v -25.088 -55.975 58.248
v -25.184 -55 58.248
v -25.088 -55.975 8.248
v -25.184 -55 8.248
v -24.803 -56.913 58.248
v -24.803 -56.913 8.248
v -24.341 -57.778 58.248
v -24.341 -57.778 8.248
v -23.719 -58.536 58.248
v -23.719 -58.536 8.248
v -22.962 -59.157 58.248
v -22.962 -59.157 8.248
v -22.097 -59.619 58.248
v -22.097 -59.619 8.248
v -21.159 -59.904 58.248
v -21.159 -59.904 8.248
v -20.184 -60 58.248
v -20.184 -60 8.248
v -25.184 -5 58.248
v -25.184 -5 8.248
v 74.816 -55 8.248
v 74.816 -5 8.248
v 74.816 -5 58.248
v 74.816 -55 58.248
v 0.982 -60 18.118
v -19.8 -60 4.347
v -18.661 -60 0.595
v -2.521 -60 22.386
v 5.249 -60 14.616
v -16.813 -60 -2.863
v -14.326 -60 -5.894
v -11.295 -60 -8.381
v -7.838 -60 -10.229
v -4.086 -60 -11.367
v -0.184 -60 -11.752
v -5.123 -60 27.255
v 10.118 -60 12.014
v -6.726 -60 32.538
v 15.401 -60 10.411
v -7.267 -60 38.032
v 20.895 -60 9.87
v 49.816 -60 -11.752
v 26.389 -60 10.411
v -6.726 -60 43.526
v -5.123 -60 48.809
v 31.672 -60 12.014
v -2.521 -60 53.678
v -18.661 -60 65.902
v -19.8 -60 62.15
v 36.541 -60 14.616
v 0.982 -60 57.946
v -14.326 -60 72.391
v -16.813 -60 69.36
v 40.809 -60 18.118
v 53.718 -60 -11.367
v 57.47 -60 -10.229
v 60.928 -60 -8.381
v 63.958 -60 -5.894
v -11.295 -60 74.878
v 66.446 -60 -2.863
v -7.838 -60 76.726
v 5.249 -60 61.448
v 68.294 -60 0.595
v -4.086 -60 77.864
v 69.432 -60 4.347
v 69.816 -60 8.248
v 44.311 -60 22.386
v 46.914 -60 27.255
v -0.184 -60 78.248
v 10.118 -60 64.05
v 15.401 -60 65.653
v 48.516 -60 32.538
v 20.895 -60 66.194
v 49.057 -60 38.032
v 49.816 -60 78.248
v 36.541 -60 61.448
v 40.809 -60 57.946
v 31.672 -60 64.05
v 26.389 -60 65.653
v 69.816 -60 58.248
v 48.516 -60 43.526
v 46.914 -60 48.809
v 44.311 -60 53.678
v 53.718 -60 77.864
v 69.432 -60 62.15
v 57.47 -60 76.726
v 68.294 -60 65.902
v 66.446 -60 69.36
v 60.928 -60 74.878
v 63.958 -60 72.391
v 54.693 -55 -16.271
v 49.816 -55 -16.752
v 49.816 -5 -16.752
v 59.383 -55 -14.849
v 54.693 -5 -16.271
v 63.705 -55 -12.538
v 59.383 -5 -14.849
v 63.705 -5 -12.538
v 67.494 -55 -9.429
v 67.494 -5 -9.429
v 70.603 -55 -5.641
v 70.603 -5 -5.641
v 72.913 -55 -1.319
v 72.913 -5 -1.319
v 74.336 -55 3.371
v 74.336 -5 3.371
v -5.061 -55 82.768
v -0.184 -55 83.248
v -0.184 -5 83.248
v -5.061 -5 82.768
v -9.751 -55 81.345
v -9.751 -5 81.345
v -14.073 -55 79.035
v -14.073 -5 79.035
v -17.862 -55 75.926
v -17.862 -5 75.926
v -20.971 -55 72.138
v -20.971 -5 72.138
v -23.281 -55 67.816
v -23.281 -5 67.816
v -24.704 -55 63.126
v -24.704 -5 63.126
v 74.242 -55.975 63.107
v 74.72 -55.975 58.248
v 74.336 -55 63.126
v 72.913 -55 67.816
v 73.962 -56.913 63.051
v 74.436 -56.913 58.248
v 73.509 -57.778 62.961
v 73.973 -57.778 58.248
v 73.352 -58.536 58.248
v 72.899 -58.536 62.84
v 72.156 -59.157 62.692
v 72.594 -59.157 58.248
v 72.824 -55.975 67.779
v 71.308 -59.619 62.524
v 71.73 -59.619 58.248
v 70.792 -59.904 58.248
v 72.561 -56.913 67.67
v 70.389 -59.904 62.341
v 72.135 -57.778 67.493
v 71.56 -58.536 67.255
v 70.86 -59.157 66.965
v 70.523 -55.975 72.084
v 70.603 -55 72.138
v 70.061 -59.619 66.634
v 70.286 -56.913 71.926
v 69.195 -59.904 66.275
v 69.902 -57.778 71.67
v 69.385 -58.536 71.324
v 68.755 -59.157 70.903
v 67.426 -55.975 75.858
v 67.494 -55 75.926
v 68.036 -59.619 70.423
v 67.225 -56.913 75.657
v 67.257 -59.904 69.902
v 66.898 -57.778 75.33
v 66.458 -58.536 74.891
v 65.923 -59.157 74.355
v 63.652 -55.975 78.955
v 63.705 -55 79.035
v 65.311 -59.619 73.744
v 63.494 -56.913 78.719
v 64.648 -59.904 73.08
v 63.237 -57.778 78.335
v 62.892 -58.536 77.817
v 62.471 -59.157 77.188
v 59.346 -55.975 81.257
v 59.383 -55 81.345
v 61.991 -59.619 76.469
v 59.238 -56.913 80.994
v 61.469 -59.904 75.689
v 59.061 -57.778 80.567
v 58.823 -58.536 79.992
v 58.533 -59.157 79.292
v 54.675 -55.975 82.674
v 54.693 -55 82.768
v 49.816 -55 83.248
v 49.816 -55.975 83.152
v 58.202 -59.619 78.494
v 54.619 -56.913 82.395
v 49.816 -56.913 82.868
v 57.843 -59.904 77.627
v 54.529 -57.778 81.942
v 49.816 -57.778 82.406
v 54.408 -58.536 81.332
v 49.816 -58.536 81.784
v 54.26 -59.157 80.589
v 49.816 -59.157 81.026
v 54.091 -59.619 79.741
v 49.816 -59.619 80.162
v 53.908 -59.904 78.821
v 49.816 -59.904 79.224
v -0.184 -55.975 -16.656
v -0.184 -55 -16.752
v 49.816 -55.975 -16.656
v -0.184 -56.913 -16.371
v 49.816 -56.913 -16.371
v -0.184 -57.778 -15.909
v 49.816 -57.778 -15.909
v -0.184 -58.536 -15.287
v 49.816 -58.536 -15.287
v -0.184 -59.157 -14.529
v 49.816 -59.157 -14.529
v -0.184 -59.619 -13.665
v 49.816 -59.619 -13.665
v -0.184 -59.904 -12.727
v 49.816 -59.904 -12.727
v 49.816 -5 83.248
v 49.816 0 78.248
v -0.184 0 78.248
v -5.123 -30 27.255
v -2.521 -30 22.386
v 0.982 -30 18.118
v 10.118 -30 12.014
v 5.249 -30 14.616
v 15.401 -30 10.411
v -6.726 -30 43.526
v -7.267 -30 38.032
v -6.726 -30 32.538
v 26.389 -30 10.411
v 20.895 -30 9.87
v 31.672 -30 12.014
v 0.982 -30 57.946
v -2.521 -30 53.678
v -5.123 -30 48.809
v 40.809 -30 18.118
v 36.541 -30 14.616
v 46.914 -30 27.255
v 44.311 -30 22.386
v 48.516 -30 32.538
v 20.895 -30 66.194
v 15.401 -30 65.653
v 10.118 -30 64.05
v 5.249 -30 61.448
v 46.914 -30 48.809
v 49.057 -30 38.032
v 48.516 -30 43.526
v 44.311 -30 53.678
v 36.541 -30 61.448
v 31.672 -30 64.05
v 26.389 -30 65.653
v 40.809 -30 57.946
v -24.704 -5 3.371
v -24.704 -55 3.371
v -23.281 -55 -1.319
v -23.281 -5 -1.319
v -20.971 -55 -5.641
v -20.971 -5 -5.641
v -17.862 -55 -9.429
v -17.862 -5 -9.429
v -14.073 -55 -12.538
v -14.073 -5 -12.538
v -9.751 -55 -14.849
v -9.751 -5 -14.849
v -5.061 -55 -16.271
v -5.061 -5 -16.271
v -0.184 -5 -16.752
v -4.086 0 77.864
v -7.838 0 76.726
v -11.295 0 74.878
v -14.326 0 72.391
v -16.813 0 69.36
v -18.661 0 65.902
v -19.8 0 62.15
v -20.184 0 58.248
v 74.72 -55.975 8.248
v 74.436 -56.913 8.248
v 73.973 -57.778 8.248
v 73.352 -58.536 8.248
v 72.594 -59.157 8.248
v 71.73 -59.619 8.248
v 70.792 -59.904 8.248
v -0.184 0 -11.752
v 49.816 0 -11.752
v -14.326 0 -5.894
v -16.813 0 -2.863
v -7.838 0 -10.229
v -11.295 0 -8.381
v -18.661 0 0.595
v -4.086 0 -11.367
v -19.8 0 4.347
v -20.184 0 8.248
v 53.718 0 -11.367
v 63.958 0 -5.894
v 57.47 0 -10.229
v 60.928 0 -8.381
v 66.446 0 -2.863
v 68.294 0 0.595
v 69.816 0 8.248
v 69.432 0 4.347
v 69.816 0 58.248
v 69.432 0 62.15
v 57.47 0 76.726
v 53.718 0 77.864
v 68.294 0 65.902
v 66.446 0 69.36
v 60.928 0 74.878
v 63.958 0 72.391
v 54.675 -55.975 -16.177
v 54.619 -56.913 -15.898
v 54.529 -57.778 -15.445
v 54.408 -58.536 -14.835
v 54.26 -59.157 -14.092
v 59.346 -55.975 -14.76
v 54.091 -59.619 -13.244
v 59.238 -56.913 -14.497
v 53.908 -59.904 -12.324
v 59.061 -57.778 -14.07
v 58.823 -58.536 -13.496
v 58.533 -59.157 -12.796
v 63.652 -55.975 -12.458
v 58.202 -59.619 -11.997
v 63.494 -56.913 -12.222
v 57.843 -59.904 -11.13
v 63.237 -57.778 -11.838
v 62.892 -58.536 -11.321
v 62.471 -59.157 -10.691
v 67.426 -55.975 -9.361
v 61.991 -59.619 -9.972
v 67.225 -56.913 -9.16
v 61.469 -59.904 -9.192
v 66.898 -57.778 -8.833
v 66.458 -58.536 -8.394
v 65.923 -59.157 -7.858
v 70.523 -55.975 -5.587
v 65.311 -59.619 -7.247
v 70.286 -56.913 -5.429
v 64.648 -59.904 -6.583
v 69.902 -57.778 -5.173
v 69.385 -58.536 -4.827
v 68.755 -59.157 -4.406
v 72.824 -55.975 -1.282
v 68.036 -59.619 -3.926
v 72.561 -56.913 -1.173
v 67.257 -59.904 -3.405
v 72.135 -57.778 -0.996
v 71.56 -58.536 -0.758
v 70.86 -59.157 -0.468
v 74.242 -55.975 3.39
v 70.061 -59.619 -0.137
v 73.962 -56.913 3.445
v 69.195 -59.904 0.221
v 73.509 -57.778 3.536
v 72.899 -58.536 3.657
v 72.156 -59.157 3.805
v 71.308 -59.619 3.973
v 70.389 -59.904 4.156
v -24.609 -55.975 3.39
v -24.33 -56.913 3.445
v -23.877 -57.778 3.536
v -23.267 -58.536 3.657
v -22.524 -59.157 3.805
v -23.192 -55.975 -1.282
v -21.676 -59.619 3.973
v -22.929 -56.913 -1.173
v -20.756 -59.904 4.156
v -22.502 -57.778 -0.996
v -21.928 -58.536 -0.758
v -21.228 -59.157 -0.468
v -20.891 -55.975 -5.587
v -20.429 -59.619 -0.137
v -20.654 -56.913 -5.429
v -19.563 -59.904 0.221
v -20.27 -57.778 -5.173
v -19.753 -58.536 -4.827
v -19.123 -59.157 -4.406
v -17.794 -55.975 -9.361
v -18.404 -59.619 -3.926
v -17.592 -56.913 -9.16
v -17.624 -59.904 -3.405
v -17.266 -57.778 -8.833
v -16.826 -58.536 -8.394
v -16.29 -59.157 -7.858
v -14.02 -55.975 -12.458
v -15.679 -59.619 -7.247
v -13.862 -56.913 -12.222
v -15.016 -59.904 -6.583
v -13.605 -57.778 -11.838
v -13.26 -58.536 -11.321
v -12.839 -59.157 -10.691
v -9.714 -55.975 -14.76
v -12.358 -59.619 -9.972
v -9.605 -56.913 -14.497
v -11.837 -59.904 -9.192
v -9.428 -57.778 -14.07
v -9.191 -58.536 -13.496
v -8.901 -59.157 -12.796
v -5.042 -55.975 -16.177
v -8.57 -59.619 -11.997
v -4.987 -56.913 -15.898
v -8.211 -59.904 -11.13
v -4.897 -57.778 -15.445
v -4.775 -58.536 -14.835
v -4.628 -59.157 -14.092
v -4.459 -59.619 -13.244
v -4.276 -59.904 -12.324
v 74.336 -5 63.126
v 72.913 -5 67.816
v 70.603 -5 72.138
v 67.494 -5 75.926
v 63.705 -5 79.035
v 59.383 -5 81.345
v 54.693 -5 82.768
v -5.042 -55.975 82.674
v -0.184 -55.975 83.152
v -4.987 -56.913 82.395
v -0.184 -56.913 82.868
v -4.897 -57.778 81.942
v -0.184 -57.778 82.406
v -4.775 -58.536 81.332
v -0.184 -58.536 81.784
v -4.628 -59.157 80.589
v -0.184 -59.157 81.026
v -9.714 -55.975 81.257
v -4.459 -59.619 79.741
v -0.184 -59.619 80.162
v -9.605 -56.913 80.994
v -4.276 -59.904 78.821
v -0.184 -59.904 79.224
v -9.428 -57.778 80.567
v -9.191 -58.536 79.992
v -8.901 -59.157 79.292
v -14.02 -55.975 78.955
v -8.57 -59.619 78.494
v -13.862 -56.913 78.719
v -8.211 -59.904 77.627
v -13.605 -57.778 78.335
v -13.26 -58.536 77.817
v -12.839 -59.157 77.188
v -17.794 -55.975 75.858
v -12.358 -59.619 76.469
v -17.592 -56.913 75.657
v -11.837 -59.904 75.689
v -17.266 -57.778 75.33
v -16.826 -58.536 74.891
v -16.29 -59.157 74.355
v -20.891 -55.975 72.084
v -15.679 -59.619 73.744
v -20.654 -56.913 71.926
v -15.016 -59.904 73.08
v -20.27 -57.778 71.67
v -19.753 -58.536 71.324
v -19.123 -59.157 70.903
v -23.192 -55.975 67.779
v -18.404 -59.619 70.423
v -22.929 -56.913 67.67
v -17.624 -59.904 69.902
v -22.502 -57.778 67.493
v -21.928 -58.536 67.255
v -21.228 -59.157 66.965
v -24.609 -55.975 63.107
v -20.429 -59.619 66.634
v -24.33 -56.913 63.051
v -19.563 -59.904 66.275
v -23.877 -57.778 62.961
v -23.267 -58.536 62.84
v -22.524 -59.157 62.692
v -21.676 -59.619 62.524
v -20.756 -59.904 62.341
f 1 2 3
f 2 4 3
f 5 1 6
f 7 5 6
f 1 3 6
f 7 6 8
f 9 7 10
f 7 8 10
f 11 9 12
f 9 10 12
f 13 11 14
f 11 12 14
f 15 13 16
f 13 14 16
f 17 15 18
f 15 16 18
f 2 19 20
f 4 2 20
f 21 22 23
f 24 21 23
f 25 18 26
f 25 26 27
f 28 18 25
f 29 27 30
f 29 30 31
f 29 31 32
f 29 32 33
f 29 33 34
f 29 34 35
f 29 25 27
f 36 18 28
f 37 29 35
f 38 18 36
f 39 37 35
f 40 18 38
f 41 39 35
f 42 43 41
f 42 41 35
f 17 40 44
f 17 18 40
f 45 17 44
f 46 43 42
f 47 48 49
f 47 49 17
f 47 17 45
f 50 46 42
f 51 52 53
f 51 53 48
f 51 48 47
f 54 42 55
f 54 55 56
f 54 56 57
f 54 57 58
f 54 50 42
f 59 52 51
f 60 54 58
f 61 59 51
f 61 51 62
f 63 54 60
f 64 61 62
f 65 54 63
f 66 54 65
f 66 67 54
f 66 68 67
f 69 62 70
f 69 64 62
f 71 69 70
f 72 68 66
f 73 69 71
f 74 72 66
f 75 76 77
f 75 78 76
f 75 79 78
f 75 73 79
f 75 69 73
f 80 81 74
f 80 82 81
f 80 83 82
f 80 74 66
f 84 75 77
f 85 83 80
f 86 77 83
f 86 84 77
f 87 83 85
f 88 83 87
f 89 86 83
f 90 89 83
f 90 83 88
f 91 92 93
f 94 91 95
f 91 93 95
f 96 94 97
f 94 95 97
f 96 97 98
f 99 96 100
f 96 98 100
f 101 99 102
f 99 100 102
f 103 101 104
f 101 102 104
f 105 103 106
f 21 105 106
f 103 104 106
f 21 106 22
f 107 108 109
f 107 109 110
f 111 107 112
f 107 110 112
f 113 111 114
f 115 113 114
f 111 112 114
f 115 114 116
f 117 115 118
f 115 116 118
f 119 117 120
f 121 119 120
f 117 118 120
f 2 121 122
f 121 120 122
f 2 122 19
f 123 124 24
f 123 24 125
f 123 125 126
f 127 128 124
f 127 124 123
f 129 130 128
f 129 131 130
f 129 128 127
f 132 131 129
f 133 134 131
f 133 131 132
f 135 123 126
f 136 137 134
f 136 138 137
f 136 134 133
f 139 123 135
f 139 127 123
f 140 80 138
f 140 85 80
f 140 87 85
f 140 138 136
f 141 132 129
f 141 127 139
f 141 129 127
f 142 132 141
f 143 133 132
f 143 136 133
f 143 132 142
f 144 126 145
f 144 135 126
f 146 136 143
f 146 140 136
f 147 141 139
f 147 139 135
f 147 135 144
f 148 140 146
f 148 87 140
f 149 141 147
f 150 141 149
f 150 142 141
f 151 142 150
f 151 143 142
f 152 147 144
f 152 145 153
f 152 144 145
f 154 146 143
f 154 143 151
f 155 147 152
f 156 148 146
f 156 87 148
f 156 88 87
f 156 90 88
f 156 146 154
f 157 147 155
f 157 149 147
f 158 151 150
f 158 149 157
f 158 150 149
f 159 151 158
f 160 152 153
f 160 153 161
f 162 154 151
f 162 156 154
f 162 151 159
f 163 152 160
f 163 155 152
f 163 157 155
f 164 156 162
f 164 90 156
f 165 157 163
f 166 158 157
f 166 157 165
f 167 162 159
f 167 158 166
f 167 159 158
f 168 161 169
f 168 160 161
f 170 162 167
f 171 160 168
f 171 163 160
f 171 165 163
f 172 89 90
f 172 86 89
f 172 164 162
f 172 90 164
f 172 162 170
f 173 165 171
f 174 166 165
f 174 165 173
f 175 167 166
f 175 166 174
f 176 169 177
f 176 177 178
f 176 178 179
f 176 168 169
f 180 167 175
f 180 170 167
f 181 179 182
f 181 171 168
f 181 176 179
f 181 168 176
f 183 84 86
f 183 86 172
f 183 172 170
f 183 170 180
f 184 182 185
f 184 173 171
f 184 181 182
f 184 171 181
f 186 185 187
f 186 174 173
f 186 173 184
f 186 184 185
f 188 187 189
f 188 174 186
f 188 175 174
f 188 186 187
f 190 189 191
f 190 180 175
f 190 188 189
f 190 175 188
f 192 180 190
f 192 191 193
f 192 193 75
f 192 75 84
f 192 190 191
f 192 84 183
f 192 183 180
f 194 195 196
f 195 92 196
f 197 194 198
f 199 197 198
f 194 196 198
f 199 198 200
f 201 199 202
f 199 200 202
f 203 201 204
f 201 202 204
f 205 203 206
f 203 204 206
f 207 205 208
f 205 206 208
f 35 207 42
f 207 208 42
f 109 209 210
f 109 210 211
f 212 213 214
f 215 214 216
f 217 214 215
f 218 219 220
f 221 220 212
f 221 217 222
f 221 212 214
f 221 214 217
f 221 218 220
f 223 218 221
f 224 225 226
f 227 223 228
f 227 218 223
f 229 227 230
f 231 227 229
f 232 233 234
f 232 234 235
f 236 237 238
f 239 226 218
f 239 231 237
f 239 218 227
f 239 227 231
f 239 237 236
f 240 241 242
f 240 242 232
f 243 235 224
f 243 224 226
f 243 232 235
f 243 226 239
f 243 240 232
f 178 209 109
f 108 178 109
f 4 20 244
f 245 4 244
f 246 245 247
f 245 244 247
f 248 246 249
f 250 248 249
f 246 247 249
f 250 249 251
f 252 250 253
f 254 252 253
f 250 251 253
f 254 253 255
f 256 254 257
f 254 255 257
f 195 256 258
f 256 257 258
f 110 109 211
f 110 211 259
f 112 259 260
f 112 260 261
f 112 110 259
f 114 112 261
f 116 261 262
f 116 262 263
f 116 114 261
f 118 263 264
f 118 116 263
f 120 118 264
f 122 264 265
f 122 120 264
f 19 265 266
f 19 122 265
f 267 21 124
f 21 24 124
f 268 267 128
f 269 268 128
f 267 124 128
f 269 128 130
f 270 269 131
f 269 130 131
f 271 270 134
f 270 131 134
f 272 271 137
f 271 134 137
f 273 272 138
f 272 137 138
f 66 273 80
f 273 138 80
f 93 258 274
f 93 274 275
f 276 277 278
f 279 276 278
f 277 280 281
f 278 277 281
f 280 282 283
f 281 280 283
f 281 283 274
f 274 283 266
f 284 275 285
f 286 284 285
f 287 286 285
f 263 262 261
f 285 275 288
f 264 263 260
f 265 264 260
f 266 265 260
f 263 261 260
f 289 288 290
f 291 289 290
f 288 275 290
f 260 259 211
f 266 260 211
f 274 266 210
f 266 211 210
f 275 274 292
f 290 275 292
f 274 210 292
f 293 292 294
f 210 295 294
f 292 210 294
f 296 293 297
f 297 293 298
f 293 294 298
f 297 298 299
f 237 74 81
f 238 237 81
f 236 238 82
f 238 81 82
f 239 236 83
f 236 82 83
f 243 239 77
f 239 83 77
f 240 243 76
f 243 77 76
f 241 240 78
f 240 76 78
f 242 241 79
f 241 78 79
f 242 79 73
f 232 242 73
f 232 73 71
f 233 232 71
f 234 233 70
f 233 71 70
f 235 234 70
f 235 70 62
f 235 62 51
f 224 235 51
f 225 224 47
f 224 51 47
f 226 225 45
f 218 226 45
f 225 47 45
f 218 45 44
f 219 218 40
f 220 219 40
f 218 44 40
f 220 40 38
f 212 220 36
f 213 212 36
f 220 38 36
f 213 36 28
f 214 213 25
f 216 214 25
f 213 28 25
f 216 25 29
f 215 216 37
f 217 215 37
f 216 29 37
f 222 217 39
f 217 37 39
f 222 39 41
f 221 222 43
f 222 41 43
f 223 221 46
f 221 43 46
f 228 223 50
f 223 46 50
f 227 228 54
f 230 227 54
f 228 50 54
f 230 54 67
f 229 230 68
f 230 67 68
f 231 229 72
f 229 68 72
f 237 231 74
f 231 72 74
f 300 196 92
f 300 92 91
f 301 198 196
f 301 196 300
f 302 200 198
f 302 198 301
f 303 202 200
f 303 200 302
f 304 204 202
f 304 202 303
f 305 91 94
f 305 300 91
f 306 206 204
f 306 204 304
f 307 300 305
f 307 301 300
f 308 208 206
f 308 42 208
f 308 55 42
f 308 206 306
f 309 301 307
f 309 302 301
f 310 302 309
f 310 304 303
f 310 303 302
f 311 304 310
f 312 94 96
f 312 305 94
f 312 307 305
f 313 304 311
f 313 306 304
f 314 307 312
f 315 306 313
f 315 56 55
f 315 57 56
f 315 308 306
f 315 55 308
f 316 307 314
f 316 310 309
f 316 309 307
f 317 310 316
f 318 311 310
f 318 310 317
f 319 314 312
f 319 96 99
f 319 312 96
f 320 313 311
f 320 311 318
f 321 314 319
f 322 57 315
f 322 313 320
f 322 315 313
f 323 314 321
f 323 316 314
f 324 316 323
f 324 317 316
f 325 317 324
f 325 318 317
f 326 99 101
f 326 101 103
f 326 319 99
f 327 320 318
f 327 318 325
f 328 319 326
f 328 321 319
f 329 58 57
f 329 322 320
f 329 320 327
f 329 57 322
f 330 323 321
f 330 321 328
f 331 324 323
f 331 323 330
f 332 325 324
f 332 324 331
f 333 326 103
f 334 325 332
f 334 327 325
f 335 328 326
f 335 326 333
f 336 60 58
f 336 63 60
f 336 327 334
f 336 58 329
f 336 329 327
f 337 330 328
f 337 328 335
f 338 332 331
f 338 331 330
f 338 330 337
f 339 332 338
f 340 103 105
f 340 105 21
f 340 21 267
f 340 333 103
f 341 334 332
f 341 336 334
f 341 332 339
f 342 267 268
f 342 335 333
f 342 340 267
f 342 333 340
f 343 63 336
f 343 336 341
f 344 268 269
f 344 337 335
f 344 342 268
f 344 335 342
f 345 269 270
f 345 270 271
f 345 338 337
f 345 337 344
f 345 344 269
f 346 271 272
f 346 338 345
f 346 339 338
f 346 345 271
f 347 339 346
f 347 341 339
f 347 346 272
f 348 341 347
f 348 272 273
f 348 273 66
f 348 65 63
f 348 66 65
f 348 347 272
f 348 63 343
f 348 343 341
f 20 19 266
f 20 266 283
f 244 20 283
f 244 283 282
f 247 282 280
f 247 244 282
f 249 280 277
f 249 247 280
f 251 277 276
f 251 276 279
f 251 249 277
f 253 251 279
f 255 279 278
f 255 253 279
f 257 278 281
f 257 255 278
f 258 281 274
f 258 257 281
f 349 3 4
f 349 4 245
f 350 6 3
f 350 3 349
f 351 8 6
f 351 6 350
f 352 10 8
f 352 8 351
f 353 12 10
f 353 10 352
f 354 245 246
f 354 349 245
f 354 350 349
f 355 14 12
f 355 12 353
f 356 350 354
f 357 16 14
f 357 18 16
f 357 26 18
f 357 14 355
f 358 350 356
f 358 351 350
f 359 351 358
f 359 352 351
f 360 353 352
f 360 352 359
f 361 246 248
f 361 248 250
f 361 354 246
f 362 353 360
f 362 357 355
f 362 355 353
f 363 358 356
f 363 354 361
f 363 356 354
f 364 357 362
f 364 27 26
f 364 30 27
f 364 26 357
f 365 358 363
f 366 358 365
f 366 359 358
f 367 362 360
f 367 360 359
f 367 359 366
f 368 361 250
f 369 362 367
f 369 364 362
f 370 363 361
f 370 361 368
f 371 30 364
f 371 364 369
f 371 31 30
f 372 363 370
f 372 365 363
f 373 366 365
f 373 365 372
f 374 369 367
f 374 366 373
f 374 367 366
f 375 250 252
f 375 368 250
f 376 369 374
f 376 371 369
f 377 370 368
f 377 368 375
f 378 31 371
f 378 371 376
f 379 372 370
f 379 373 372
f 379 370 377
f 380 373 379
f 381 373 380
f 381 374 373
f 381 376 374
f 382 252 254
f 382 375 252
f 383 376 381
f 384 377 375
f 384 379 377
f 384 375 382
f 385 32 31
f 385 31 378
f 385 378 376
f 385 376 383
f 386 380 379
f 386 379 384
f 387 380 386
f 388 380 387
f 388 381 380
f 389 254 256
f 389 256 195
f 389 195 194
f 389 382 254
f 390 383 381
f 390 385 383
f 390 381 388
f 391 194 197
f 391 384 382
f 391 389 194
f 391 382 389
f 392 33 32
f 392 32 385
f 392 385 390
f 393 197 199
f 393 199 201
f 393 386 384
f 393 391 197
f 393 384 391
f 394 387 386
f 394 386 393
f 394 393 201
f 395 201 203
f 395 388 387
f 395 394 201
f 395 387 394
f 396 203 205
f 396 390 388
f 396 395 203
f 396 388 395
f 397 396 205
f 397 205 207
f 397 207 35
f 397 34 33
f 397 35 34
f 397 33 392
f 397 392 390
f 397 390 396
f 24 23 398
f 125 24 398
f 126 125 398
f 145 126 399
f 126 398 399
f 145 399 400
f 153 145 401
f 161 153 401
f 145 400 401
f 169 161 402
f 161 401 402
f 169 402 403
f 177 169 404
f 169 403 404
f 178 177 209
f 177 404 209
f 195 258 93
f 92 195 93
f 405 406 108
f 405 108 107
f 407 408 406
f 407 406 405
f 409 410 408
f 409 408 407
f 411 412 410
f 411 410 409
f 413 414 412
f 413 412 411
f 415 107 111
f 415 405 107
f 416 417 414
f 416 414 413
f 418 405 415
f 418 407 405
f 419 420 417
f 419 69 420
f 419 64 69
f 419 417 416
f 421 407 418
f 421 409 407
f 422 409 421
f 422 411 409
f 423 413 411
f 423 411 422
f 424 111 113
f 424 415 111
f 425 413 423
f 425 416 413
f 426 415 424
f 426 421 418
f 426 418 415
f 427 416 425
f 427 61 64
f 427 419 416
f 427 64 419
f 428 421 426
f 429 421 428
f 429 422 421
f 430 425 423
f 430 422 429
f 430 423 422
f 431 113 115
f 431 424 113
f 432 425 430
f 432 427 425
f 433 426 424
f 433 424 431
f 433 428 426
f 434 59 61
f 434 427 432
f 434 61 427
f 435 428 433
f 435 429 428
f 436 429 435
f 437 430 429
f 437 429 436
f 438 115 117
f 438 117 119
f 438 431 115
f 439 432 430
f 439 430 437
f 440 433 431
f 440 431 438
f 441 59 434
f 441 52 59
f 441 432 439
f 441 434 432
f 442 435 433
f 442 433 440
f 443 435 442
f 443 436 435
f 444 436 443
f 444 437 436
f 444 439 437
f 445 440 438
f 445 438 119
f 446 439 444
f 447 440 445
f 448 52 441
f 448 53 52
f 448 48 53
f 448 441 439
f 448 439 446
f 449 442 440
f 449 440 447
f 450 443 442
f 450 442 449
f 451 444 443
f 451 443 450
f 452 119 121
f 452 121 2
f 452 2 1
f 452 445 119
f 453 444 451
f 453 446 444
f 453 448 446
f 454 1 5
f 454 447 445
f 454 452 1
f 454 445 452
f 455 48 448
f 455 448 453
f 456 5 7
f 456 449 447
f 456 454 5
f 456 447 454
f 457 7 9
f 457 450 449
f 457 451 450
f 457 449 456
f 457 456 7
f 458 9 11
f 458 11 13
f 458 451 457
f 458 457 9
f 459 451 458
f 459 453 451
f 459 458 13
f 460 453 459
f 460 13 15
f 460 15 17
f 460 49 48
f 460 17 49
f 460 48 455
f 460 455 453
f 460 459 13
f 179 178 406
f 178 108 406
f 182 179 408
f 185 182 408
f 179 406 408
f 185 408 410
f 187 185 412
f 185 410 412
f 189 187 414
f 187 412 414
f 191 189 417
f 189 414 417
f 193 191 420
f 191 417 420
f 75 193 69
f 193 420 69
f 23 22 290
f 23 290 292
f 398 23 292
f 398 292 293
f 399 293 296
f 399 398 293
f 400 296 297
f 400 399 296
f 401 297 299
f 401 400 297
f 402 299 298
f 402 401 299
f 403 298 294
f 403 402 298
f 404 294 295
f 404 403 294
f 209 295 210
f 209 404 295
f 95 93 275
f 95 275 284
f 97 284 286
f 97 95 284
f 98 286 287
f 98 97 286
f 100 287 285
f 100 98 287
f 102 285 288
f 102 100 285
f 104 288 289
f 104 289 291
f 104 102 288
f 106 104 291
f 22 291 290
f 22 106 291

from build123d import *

# Parameters (mm, degrees)
F1_DEPTH = 60
F2_R     = 5
F3_SIZE  = 5
F4_R     = 28.16198
F5_DEPTH = 30


with BuildPart() as f1:
    # F0 (on Front) → F1 (new body)
    with BuildSketch(Plane.XZ):
        with BuildLine():
            Line((49.816129, 83.248417), (-0.183871, 83.248417))
            ThreePointArc((-0.183871, 83.248417), (-17.861541, 75.926086), (-25.183871, 58.248417))
            Line((-25.183871, 58.248417), (-25.183871, 8.248417))
            ThreePointArc((-25.183871, 8.248417), (-17.861541, -9.429253), (-0.183871, -16.751583))
            Line((-0.183871, -16.751583), (49.816129, -16.751583))
            ThreePointArc((49.816129, -16.751583), (67.493798, -9.429253), (74.816129, 8.248417))
            Line((74.816129, 8.248417), (74.816129, 58.248417))
            ThreePointArc((74.816129, 58.248417), (67.493798, 75.926086), (49.816129, 83.248417))
        make_face()
    extrude(amount=F1_DEPTH)

    # F2
    f2_edges = [f1.edges().sort_by_distance(p)[0] for p in [
        (74.816129, -60, 33.248417),
        (67.493798, -60, 75.926086),
        (24.816129, -60, 83.248417),
        (-17.861541, -60, 75.926086),
        (-25.183871, -60, 33.248417),
        (-17.861541, -60, -9.429253),
        (24.816129, -60, -16.751583),
        (67.493798, -60, -9.429253),
    ]]
    fillet(f2_edges, radius=F2_R)

    # F3
    f3_edges = [f1.edges().sort_by_distance(p)[0] for p in [
        (74.816129, 0, 33.248417),
        (67.493798, 0, 75.926086),
        (24.816129, 0, 83.248417),
        (-17.861541, 0, 75.926086),
        (-25.183871, 0, 33.248417),
        (-17.861541, 0, -9.429253),
        (24.816129, 0, -16.751583),
        (67.493798, 0, -9.429253),
    ]]
    chamfer(f3_edges, length=F3_SIZE)

    # F4 (on face) → F5 (cut)
    with BuildSketch(Plane.XZ.offset(60)):
        with Locations((20.895224, 38.032025)):
            Circle(F4_R)
    extrude(amount=-F5_DEPTH, mode=Mode.SUBTRACT)


solid = f1.part
